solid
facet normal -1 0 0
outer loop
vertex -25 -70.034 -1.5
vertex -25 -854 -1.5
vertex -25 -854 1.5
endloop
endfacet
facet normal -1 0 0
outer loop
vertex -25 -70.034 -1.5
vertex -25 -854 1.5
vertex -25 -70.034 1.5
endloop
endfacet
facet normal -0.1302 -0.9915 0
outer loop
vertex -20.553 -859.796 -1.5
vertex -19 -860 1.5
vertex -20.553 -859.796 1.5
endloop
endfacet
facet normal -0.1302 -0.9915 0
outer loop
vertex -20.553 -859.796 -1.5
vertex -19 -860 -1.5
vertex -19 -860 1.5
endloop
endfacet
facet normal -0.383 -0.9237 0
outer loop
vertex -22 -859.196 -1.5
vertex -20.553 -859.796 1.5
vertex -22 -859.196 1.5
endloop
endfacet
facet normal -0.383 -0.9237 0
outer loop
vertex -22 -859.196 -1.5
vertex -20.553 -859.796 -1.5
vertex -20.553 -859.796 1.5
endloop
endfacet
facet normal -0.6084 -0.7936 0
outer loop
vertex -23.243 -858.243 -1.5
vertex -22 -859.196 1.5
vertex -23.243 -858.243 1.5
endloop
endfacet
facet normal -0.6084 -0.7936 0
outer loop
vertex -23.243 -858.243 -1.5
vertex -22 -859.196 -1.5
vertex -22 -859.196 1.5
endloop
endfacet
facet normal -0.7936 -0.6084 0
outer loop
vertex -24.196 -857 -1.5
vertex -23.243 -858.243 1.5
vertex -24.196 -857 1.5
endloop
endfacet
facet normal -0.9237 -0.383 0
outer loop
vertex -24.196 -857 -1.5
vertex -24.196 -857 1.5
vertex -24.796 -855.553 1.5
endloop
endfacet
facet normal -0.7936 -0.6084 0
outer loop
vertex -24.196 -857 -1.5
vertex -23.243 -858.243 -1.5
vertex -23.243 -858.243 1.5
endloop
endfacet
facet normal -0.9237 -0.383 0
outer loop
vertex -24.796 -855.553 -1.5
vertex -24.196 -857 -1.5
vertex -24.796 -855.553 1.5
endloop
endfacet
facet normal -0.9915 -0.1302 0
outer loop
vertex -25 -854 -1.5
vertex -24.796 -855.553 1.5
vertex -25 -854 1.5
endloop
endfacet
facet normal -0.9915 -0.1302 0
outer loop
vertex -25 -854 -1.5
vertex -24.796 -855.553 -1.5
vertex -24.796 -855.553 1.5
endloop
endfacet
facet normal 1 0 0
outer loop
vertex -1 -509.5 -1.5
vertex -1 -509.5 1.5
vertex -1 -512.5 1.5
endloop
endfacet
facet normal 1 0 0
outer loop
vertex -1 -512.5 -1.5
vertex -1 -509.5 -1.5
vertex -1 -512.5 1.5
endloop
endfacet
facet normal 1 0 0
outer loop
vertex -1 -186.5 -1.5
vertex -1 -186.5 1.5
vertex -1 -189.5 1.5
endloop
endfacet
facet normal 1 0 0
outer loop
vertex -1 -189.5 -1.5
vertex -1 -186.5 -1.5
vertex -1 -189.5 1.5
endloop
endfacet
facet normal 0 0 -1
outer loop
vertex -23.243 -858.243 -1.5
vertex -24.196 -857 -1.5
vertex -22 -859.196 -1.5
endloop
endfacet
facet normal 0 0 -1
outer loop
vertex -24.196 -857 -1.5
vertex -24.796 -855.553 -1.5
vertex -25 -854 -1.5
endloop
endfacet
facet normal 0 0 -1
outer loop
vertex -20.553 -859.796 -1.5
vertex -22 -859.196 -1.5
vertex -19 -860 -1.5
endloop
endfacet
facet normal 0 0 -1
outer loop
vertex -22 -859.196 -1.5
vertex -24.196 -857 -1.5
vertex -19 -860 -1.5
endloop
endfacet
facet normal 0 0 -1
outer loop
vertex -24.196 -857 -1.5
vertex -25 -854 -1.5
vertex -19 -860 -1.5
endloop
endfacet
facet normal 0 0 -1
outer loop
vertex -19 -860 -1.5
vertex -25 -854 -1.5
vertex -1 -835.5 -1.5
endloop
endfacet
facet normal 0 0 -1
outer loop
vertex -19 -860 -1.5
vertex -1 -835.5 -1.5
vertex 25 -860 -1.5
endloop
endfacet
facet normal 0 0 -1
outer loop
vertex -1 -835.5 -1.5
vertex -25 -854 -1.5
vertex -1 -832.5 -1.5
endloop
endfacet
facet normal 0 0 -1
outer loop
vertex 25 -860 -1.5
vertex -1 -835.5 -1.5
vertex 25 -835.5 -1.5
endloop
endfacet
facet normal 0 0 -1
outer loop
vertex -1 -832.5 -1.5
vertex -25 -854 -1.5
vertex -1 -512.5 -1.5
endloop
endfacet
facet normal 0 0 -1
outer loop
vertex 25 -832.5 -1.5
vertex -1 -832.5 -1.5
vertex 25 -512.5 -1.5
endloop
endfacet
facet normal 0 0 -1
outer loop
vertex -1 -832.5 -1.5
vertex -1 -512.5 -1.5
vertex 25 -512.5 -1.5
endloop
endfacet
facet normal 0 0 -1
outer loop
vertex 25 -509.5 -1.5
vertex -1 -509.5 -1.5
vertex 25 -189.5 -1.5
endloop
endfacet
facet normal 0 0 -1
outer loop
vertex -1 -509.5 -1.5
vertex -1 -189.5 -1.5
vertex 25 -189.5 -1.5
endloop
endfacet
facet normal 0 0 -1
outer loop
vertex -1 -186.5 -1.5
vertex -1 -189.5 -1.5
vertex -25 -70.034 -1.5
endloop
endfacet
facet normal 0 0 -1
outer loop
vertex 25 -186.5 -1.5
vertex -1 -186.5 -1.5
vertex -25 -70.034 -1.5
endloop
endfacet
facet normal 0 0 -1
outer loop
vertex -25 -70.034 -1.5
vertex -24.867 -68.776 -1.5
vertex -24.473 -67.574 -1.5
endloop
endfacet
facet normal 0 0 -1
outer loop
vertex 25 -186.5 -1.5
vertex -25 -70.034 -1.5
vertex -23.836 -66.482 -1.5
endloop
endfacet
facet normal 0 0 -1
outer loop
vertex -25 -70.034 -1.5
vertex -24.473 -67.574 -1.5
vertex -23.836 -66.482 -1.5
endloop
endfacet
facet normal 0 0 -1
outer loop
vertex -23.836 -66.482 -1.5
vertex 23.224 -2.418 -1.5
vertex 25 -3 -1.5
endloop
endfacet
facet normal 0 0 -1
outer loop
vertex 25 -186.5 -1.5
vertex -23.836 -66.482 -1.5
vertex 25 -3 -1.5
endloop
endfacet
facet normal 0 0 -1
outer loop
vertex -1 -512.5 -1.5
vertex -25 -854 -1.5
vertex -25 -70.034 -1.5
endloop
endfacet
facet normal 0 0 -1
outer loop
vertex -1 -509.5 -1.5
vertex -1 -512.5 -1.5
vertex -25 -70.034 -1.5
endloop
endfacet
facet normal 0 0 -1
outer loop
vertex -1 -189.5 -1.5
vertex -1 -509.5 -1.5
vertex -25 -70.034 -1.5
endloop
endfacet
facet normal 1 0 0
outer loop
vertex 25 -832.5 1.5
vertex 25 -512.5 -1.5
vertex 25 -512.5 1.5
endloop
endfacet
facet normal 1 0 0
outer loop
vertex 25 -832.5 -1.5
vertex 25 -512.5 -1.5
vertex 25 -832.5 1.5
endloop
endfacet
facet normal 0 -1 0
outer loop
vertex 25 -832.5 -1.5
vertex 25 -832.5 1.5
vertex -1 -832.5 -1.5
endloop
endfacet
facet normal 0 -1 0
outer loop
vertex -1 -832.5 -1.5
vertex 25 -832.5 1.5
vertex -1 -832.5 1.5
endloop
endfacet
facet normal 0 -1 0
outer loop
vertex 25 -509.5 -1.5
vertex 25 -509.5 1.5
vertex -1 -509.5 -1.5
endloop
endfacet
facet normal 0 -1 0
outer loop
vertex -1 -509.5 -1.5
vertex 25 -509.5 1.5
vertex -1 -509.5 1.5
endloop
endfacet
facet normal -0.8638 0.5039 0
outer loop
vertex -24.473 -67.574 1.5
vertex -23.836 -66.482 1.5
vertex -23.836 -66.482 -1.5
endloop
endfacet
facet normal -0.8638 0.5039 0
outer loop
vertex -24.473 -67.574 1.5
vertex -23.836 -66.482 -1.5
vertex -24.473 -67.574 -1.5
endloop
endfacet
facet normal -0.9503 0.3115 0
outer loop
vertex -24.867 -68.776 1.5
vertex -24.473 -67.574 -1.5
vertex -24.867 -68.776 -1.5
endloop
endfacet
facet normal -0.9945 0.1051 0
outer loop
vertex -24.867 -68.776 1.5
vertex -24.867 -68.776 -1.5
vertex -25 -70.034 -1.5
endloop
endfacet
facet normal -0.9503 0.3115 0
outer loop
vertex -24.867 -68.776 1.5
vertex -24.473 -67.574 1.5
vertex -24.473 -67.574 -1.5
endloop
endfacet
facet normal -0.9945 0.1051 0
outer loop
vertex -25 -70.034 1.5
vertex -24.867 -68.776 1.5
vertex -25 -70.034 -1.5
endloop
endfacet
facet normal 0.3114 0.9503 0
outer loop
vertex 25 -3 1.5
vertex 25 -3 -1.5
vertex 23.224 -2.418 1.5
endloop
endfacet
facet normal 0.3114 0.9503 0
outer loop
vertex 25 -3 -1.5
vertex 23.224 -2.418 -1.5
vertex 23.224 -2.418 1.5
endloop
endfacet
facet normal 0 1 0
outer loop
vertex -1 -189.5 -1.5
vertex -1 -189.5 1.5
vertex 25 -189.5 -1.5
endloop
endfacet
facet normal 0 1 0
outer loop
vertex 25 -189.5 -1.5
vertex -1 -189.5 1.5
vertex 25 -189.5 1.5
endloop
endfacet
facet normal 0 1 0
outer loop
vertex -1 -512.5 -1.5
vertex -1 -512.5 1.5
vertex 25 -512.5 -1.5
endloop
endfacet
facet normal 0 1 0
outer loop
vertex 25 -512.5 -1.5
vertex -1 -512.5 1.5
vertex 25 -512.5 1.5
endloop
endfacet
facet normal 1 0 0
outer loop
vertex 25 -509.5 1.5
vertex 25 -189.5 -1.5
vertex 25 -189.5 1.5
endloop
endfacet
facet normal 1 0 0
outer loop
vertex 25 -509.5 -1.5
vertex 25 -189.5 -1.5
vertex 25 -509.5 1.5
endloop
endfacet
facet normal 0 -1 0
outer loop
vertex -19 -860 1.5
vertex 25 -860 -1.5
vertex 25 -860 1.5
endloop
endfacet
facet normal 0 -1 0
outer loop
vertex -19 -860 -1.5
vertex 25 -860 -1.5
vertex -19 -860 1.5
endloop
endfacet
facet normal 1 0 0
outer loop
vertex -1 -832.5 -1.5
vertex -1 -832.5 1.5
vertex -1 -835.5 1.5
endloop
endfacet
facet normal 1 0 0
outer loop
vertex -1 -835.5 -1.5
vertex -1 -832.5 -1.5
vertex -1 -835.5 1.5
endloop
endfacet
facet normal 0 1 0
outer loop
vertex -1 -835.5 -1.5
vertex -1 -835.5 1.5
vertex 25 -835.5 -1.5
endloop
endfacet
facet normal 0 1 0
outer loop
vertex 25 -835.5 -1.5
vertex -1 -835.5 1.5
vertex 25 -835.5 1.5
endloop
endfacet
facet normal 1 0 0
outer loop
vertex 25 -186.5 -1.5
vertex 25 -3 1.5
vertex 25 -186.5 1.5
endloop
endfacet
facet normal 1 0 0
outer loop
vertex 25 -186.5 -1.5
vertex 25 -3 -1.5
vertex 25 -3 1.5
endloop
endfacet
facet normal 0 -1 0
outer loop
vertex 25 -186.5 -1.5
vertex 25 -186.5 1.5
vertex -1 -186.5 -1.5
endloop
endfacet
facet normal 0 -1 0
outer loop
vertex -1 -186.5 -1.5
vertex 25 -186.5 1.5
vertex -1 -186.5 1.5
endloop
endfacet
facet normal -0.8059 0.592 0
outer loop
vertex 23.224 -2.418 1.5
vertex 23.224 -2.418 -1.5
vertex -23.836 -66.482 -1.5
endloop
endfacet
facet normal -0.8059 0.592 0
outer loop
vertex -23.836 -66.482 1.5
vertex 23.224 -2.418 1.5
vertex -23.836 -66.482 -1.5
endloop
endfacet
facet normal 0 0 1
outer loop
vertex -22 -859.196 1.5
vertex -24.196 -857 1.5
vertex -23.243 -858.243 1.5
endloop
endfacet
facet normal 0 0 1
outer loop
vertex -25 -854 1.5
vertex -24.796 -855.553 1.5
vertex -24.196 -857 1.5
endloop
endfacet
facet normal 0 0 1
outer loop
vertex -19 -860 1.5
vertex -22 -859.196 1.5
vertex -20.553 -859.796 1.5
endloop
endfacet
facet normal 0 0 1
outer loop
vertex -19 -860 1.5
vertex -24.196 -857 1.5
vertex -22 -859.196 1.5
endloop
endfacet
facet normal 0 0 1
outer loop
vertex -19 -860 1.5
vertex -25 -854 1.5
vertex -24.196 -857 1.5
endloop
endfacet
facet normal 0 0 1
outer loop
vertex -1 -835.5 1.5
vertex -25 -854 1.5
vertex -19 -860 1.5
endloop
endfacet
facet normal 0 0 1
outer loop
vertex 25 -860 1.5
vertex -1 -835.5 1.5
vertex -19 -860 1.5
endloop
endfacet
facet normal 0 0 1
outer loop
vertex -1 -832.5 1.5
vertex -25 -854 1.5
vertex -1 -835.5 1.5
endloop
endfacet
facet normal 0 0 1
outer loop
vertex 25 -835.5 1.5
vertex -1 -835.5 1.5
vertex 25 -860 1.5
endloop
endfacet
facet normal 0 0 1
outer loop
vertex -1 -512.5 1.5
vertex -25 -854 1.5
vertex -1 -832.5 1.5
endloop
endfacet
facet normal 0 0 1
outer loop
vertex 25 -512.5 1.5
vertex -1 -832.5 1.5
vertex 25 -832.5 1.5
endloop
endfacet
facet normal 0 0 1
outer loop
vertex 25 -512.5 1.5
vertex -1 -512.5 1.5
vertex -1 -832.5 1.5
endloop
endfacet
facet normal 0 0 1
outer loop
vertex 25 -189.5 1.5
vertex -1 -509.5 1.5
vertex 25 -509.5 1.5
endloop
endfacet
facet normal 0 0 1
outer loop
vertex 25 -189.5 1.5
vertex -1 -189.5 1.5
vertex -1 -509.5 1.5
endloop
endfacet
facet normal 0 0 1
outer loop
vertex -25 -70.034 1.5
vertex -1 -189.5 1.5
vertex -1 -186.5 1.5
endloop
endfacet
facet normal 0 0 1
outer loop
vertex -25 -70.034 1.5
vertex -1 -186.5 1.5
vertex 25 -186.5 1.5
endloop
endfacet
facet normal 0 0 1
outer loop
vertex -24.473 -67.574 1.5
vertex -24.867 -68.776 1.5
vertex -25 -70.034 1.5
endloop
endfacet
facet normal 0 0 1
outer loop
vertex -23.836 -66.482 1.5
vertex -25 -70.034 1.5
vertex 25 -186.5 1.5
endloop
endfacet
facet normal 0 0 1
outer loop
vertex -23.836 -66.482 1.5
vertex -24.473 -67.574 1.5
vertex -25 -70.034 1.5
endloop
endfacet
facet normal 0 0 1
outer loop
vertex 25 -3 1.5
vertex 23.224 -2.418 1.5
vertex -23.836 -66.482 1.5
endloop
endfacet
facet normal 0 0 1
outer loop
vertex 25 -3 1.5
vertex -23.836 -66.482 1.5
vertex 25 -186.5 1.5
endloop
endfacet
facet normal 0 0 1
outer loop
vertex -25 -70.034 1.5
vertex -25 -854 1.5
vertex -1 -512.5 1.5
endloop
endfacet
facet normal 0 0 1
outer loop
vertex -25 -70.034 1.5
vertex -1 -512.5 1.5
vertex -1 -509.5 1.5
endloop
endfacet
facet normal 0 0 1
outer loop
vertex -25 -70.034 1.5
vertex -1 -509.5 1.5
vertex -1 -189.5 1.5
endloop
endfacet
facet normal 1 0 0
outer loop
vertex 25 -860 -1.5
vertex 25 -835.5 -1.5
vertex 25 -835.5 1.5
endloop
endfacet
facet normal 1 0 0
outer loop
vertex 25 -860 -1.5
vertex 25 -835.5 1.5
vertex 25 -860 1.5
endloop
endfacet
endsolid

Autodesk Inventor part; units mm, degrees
ref_plane "YZ Plane" through (0, 0, 0) normal (1, 0, 0) x (0, 1, 0)
ref_plane "XZ Plane" through (0, 0, 0) normal (0, 1, 0) x (-1, 0, 0)
ref_plane "XY Plane" through (0, 0, 0) normal (0, 0, 1) x (1, 0, 0)
sketch "Sketch1" plane through (0, 0, 0) normal (0, 0, 1) x (1, 0, 0)
  line L0 (-25, 0) -> (25, 0)
  line L1 (25, 0) -> (25, -860)
  line L2 (25, -860) -> (-25, -860)
  line L3 (-25, -860) -> (-25, 0)
  line L4 (25, 0) -> (-25, -68.0668)
  point P0 (0, 0)
  point P1 (0, 0)
  point P2 (25, -1153.2713)
  dimension "d0" = 50
  dimension "d1" = 860
  dimension "d6" = 53.7
extrude "Plate1" add sketch "Sketch1" along normal mid plane 3 contours L1 L2 L3 L4
chamfer "Corner Chamfer2" distance 3 angle 45 1 edges at (25, 0, 0)
fillet "Corner Round1" radius 6 1 edges at (-25, -68.0668, 0)
sketch "Sketch2" plane through (0, 0, 1.5) normal (0, 0, 1) x (1, 0, 0)
  line L0 (25, -186.5) -> (-1, -186.5)
  line L1 (-1, -186.5) -> (-1, -189.5)
  line L2 (-1, -189.5) -> (25, -189.5)
  line L3 (25, -189.5) -> (25, -186.5)
  line L4 (25, -3) -> (25, -860) projected
  point P0 (0, 0)
  point P1 (25, -188)
  point P2 (25, -827)
  dimension "d15" = 188
  dimension "d16" = 26
  dimension "d17" = 3
extrude "Extrusion1" cut sketch "Sketch2" against normal through all
pattern_linear "Rectangular Pattern1" count 3 spacing 323 along (0, -1, 0) of "Extrusion1"
fillet "Corner Round3" radius 6 1 edges at (-25, -860, 0)
sketch "Sketch3" plane through (0, 0, -1.5) normal (0, 0, -1) x (-1, 0, 0)
  line L0 (-4.7159, -271.7572) -> (4.3119, -271.7572) construction
  line L1 (4.3119, -271.7572) -> (4.3119, -401.2704) construction
  line L2 (4.3119, -401.2704) -> (-4.7159, -401.2704) construction
  line L3 (-4.7159, -401.2704) -> (-4.7159, -271.7572) construction
  point P0 (0, 0)
mark "Mark1"
equation "\"d6\" = d5"
equation "\"d2\" = Thickness"
equation "\"BendReliefWidth\" = Thickness"
equation "\"BendReliefDepth\" = 0.5 * Thickness"
equation "\"CornerReliefSize\" = 4 * Thickness"
equation "\"MinimumRemnant\" = 2 * Thickness"
equation "\"TransitionRadius\" = BendRadius"
equation "\"JacobiRadiusSize\" = BendRadius"
equation "\"GapSize\" = Thickness"
equation "\"d5\" = 53.7deg"
equation "\"Thickness\" = 3"
equation "\"BendRadius\" = 5"
properties part number "MSC 603 STRINGER CONE EXIT BACK" material "Stainless Steel"
